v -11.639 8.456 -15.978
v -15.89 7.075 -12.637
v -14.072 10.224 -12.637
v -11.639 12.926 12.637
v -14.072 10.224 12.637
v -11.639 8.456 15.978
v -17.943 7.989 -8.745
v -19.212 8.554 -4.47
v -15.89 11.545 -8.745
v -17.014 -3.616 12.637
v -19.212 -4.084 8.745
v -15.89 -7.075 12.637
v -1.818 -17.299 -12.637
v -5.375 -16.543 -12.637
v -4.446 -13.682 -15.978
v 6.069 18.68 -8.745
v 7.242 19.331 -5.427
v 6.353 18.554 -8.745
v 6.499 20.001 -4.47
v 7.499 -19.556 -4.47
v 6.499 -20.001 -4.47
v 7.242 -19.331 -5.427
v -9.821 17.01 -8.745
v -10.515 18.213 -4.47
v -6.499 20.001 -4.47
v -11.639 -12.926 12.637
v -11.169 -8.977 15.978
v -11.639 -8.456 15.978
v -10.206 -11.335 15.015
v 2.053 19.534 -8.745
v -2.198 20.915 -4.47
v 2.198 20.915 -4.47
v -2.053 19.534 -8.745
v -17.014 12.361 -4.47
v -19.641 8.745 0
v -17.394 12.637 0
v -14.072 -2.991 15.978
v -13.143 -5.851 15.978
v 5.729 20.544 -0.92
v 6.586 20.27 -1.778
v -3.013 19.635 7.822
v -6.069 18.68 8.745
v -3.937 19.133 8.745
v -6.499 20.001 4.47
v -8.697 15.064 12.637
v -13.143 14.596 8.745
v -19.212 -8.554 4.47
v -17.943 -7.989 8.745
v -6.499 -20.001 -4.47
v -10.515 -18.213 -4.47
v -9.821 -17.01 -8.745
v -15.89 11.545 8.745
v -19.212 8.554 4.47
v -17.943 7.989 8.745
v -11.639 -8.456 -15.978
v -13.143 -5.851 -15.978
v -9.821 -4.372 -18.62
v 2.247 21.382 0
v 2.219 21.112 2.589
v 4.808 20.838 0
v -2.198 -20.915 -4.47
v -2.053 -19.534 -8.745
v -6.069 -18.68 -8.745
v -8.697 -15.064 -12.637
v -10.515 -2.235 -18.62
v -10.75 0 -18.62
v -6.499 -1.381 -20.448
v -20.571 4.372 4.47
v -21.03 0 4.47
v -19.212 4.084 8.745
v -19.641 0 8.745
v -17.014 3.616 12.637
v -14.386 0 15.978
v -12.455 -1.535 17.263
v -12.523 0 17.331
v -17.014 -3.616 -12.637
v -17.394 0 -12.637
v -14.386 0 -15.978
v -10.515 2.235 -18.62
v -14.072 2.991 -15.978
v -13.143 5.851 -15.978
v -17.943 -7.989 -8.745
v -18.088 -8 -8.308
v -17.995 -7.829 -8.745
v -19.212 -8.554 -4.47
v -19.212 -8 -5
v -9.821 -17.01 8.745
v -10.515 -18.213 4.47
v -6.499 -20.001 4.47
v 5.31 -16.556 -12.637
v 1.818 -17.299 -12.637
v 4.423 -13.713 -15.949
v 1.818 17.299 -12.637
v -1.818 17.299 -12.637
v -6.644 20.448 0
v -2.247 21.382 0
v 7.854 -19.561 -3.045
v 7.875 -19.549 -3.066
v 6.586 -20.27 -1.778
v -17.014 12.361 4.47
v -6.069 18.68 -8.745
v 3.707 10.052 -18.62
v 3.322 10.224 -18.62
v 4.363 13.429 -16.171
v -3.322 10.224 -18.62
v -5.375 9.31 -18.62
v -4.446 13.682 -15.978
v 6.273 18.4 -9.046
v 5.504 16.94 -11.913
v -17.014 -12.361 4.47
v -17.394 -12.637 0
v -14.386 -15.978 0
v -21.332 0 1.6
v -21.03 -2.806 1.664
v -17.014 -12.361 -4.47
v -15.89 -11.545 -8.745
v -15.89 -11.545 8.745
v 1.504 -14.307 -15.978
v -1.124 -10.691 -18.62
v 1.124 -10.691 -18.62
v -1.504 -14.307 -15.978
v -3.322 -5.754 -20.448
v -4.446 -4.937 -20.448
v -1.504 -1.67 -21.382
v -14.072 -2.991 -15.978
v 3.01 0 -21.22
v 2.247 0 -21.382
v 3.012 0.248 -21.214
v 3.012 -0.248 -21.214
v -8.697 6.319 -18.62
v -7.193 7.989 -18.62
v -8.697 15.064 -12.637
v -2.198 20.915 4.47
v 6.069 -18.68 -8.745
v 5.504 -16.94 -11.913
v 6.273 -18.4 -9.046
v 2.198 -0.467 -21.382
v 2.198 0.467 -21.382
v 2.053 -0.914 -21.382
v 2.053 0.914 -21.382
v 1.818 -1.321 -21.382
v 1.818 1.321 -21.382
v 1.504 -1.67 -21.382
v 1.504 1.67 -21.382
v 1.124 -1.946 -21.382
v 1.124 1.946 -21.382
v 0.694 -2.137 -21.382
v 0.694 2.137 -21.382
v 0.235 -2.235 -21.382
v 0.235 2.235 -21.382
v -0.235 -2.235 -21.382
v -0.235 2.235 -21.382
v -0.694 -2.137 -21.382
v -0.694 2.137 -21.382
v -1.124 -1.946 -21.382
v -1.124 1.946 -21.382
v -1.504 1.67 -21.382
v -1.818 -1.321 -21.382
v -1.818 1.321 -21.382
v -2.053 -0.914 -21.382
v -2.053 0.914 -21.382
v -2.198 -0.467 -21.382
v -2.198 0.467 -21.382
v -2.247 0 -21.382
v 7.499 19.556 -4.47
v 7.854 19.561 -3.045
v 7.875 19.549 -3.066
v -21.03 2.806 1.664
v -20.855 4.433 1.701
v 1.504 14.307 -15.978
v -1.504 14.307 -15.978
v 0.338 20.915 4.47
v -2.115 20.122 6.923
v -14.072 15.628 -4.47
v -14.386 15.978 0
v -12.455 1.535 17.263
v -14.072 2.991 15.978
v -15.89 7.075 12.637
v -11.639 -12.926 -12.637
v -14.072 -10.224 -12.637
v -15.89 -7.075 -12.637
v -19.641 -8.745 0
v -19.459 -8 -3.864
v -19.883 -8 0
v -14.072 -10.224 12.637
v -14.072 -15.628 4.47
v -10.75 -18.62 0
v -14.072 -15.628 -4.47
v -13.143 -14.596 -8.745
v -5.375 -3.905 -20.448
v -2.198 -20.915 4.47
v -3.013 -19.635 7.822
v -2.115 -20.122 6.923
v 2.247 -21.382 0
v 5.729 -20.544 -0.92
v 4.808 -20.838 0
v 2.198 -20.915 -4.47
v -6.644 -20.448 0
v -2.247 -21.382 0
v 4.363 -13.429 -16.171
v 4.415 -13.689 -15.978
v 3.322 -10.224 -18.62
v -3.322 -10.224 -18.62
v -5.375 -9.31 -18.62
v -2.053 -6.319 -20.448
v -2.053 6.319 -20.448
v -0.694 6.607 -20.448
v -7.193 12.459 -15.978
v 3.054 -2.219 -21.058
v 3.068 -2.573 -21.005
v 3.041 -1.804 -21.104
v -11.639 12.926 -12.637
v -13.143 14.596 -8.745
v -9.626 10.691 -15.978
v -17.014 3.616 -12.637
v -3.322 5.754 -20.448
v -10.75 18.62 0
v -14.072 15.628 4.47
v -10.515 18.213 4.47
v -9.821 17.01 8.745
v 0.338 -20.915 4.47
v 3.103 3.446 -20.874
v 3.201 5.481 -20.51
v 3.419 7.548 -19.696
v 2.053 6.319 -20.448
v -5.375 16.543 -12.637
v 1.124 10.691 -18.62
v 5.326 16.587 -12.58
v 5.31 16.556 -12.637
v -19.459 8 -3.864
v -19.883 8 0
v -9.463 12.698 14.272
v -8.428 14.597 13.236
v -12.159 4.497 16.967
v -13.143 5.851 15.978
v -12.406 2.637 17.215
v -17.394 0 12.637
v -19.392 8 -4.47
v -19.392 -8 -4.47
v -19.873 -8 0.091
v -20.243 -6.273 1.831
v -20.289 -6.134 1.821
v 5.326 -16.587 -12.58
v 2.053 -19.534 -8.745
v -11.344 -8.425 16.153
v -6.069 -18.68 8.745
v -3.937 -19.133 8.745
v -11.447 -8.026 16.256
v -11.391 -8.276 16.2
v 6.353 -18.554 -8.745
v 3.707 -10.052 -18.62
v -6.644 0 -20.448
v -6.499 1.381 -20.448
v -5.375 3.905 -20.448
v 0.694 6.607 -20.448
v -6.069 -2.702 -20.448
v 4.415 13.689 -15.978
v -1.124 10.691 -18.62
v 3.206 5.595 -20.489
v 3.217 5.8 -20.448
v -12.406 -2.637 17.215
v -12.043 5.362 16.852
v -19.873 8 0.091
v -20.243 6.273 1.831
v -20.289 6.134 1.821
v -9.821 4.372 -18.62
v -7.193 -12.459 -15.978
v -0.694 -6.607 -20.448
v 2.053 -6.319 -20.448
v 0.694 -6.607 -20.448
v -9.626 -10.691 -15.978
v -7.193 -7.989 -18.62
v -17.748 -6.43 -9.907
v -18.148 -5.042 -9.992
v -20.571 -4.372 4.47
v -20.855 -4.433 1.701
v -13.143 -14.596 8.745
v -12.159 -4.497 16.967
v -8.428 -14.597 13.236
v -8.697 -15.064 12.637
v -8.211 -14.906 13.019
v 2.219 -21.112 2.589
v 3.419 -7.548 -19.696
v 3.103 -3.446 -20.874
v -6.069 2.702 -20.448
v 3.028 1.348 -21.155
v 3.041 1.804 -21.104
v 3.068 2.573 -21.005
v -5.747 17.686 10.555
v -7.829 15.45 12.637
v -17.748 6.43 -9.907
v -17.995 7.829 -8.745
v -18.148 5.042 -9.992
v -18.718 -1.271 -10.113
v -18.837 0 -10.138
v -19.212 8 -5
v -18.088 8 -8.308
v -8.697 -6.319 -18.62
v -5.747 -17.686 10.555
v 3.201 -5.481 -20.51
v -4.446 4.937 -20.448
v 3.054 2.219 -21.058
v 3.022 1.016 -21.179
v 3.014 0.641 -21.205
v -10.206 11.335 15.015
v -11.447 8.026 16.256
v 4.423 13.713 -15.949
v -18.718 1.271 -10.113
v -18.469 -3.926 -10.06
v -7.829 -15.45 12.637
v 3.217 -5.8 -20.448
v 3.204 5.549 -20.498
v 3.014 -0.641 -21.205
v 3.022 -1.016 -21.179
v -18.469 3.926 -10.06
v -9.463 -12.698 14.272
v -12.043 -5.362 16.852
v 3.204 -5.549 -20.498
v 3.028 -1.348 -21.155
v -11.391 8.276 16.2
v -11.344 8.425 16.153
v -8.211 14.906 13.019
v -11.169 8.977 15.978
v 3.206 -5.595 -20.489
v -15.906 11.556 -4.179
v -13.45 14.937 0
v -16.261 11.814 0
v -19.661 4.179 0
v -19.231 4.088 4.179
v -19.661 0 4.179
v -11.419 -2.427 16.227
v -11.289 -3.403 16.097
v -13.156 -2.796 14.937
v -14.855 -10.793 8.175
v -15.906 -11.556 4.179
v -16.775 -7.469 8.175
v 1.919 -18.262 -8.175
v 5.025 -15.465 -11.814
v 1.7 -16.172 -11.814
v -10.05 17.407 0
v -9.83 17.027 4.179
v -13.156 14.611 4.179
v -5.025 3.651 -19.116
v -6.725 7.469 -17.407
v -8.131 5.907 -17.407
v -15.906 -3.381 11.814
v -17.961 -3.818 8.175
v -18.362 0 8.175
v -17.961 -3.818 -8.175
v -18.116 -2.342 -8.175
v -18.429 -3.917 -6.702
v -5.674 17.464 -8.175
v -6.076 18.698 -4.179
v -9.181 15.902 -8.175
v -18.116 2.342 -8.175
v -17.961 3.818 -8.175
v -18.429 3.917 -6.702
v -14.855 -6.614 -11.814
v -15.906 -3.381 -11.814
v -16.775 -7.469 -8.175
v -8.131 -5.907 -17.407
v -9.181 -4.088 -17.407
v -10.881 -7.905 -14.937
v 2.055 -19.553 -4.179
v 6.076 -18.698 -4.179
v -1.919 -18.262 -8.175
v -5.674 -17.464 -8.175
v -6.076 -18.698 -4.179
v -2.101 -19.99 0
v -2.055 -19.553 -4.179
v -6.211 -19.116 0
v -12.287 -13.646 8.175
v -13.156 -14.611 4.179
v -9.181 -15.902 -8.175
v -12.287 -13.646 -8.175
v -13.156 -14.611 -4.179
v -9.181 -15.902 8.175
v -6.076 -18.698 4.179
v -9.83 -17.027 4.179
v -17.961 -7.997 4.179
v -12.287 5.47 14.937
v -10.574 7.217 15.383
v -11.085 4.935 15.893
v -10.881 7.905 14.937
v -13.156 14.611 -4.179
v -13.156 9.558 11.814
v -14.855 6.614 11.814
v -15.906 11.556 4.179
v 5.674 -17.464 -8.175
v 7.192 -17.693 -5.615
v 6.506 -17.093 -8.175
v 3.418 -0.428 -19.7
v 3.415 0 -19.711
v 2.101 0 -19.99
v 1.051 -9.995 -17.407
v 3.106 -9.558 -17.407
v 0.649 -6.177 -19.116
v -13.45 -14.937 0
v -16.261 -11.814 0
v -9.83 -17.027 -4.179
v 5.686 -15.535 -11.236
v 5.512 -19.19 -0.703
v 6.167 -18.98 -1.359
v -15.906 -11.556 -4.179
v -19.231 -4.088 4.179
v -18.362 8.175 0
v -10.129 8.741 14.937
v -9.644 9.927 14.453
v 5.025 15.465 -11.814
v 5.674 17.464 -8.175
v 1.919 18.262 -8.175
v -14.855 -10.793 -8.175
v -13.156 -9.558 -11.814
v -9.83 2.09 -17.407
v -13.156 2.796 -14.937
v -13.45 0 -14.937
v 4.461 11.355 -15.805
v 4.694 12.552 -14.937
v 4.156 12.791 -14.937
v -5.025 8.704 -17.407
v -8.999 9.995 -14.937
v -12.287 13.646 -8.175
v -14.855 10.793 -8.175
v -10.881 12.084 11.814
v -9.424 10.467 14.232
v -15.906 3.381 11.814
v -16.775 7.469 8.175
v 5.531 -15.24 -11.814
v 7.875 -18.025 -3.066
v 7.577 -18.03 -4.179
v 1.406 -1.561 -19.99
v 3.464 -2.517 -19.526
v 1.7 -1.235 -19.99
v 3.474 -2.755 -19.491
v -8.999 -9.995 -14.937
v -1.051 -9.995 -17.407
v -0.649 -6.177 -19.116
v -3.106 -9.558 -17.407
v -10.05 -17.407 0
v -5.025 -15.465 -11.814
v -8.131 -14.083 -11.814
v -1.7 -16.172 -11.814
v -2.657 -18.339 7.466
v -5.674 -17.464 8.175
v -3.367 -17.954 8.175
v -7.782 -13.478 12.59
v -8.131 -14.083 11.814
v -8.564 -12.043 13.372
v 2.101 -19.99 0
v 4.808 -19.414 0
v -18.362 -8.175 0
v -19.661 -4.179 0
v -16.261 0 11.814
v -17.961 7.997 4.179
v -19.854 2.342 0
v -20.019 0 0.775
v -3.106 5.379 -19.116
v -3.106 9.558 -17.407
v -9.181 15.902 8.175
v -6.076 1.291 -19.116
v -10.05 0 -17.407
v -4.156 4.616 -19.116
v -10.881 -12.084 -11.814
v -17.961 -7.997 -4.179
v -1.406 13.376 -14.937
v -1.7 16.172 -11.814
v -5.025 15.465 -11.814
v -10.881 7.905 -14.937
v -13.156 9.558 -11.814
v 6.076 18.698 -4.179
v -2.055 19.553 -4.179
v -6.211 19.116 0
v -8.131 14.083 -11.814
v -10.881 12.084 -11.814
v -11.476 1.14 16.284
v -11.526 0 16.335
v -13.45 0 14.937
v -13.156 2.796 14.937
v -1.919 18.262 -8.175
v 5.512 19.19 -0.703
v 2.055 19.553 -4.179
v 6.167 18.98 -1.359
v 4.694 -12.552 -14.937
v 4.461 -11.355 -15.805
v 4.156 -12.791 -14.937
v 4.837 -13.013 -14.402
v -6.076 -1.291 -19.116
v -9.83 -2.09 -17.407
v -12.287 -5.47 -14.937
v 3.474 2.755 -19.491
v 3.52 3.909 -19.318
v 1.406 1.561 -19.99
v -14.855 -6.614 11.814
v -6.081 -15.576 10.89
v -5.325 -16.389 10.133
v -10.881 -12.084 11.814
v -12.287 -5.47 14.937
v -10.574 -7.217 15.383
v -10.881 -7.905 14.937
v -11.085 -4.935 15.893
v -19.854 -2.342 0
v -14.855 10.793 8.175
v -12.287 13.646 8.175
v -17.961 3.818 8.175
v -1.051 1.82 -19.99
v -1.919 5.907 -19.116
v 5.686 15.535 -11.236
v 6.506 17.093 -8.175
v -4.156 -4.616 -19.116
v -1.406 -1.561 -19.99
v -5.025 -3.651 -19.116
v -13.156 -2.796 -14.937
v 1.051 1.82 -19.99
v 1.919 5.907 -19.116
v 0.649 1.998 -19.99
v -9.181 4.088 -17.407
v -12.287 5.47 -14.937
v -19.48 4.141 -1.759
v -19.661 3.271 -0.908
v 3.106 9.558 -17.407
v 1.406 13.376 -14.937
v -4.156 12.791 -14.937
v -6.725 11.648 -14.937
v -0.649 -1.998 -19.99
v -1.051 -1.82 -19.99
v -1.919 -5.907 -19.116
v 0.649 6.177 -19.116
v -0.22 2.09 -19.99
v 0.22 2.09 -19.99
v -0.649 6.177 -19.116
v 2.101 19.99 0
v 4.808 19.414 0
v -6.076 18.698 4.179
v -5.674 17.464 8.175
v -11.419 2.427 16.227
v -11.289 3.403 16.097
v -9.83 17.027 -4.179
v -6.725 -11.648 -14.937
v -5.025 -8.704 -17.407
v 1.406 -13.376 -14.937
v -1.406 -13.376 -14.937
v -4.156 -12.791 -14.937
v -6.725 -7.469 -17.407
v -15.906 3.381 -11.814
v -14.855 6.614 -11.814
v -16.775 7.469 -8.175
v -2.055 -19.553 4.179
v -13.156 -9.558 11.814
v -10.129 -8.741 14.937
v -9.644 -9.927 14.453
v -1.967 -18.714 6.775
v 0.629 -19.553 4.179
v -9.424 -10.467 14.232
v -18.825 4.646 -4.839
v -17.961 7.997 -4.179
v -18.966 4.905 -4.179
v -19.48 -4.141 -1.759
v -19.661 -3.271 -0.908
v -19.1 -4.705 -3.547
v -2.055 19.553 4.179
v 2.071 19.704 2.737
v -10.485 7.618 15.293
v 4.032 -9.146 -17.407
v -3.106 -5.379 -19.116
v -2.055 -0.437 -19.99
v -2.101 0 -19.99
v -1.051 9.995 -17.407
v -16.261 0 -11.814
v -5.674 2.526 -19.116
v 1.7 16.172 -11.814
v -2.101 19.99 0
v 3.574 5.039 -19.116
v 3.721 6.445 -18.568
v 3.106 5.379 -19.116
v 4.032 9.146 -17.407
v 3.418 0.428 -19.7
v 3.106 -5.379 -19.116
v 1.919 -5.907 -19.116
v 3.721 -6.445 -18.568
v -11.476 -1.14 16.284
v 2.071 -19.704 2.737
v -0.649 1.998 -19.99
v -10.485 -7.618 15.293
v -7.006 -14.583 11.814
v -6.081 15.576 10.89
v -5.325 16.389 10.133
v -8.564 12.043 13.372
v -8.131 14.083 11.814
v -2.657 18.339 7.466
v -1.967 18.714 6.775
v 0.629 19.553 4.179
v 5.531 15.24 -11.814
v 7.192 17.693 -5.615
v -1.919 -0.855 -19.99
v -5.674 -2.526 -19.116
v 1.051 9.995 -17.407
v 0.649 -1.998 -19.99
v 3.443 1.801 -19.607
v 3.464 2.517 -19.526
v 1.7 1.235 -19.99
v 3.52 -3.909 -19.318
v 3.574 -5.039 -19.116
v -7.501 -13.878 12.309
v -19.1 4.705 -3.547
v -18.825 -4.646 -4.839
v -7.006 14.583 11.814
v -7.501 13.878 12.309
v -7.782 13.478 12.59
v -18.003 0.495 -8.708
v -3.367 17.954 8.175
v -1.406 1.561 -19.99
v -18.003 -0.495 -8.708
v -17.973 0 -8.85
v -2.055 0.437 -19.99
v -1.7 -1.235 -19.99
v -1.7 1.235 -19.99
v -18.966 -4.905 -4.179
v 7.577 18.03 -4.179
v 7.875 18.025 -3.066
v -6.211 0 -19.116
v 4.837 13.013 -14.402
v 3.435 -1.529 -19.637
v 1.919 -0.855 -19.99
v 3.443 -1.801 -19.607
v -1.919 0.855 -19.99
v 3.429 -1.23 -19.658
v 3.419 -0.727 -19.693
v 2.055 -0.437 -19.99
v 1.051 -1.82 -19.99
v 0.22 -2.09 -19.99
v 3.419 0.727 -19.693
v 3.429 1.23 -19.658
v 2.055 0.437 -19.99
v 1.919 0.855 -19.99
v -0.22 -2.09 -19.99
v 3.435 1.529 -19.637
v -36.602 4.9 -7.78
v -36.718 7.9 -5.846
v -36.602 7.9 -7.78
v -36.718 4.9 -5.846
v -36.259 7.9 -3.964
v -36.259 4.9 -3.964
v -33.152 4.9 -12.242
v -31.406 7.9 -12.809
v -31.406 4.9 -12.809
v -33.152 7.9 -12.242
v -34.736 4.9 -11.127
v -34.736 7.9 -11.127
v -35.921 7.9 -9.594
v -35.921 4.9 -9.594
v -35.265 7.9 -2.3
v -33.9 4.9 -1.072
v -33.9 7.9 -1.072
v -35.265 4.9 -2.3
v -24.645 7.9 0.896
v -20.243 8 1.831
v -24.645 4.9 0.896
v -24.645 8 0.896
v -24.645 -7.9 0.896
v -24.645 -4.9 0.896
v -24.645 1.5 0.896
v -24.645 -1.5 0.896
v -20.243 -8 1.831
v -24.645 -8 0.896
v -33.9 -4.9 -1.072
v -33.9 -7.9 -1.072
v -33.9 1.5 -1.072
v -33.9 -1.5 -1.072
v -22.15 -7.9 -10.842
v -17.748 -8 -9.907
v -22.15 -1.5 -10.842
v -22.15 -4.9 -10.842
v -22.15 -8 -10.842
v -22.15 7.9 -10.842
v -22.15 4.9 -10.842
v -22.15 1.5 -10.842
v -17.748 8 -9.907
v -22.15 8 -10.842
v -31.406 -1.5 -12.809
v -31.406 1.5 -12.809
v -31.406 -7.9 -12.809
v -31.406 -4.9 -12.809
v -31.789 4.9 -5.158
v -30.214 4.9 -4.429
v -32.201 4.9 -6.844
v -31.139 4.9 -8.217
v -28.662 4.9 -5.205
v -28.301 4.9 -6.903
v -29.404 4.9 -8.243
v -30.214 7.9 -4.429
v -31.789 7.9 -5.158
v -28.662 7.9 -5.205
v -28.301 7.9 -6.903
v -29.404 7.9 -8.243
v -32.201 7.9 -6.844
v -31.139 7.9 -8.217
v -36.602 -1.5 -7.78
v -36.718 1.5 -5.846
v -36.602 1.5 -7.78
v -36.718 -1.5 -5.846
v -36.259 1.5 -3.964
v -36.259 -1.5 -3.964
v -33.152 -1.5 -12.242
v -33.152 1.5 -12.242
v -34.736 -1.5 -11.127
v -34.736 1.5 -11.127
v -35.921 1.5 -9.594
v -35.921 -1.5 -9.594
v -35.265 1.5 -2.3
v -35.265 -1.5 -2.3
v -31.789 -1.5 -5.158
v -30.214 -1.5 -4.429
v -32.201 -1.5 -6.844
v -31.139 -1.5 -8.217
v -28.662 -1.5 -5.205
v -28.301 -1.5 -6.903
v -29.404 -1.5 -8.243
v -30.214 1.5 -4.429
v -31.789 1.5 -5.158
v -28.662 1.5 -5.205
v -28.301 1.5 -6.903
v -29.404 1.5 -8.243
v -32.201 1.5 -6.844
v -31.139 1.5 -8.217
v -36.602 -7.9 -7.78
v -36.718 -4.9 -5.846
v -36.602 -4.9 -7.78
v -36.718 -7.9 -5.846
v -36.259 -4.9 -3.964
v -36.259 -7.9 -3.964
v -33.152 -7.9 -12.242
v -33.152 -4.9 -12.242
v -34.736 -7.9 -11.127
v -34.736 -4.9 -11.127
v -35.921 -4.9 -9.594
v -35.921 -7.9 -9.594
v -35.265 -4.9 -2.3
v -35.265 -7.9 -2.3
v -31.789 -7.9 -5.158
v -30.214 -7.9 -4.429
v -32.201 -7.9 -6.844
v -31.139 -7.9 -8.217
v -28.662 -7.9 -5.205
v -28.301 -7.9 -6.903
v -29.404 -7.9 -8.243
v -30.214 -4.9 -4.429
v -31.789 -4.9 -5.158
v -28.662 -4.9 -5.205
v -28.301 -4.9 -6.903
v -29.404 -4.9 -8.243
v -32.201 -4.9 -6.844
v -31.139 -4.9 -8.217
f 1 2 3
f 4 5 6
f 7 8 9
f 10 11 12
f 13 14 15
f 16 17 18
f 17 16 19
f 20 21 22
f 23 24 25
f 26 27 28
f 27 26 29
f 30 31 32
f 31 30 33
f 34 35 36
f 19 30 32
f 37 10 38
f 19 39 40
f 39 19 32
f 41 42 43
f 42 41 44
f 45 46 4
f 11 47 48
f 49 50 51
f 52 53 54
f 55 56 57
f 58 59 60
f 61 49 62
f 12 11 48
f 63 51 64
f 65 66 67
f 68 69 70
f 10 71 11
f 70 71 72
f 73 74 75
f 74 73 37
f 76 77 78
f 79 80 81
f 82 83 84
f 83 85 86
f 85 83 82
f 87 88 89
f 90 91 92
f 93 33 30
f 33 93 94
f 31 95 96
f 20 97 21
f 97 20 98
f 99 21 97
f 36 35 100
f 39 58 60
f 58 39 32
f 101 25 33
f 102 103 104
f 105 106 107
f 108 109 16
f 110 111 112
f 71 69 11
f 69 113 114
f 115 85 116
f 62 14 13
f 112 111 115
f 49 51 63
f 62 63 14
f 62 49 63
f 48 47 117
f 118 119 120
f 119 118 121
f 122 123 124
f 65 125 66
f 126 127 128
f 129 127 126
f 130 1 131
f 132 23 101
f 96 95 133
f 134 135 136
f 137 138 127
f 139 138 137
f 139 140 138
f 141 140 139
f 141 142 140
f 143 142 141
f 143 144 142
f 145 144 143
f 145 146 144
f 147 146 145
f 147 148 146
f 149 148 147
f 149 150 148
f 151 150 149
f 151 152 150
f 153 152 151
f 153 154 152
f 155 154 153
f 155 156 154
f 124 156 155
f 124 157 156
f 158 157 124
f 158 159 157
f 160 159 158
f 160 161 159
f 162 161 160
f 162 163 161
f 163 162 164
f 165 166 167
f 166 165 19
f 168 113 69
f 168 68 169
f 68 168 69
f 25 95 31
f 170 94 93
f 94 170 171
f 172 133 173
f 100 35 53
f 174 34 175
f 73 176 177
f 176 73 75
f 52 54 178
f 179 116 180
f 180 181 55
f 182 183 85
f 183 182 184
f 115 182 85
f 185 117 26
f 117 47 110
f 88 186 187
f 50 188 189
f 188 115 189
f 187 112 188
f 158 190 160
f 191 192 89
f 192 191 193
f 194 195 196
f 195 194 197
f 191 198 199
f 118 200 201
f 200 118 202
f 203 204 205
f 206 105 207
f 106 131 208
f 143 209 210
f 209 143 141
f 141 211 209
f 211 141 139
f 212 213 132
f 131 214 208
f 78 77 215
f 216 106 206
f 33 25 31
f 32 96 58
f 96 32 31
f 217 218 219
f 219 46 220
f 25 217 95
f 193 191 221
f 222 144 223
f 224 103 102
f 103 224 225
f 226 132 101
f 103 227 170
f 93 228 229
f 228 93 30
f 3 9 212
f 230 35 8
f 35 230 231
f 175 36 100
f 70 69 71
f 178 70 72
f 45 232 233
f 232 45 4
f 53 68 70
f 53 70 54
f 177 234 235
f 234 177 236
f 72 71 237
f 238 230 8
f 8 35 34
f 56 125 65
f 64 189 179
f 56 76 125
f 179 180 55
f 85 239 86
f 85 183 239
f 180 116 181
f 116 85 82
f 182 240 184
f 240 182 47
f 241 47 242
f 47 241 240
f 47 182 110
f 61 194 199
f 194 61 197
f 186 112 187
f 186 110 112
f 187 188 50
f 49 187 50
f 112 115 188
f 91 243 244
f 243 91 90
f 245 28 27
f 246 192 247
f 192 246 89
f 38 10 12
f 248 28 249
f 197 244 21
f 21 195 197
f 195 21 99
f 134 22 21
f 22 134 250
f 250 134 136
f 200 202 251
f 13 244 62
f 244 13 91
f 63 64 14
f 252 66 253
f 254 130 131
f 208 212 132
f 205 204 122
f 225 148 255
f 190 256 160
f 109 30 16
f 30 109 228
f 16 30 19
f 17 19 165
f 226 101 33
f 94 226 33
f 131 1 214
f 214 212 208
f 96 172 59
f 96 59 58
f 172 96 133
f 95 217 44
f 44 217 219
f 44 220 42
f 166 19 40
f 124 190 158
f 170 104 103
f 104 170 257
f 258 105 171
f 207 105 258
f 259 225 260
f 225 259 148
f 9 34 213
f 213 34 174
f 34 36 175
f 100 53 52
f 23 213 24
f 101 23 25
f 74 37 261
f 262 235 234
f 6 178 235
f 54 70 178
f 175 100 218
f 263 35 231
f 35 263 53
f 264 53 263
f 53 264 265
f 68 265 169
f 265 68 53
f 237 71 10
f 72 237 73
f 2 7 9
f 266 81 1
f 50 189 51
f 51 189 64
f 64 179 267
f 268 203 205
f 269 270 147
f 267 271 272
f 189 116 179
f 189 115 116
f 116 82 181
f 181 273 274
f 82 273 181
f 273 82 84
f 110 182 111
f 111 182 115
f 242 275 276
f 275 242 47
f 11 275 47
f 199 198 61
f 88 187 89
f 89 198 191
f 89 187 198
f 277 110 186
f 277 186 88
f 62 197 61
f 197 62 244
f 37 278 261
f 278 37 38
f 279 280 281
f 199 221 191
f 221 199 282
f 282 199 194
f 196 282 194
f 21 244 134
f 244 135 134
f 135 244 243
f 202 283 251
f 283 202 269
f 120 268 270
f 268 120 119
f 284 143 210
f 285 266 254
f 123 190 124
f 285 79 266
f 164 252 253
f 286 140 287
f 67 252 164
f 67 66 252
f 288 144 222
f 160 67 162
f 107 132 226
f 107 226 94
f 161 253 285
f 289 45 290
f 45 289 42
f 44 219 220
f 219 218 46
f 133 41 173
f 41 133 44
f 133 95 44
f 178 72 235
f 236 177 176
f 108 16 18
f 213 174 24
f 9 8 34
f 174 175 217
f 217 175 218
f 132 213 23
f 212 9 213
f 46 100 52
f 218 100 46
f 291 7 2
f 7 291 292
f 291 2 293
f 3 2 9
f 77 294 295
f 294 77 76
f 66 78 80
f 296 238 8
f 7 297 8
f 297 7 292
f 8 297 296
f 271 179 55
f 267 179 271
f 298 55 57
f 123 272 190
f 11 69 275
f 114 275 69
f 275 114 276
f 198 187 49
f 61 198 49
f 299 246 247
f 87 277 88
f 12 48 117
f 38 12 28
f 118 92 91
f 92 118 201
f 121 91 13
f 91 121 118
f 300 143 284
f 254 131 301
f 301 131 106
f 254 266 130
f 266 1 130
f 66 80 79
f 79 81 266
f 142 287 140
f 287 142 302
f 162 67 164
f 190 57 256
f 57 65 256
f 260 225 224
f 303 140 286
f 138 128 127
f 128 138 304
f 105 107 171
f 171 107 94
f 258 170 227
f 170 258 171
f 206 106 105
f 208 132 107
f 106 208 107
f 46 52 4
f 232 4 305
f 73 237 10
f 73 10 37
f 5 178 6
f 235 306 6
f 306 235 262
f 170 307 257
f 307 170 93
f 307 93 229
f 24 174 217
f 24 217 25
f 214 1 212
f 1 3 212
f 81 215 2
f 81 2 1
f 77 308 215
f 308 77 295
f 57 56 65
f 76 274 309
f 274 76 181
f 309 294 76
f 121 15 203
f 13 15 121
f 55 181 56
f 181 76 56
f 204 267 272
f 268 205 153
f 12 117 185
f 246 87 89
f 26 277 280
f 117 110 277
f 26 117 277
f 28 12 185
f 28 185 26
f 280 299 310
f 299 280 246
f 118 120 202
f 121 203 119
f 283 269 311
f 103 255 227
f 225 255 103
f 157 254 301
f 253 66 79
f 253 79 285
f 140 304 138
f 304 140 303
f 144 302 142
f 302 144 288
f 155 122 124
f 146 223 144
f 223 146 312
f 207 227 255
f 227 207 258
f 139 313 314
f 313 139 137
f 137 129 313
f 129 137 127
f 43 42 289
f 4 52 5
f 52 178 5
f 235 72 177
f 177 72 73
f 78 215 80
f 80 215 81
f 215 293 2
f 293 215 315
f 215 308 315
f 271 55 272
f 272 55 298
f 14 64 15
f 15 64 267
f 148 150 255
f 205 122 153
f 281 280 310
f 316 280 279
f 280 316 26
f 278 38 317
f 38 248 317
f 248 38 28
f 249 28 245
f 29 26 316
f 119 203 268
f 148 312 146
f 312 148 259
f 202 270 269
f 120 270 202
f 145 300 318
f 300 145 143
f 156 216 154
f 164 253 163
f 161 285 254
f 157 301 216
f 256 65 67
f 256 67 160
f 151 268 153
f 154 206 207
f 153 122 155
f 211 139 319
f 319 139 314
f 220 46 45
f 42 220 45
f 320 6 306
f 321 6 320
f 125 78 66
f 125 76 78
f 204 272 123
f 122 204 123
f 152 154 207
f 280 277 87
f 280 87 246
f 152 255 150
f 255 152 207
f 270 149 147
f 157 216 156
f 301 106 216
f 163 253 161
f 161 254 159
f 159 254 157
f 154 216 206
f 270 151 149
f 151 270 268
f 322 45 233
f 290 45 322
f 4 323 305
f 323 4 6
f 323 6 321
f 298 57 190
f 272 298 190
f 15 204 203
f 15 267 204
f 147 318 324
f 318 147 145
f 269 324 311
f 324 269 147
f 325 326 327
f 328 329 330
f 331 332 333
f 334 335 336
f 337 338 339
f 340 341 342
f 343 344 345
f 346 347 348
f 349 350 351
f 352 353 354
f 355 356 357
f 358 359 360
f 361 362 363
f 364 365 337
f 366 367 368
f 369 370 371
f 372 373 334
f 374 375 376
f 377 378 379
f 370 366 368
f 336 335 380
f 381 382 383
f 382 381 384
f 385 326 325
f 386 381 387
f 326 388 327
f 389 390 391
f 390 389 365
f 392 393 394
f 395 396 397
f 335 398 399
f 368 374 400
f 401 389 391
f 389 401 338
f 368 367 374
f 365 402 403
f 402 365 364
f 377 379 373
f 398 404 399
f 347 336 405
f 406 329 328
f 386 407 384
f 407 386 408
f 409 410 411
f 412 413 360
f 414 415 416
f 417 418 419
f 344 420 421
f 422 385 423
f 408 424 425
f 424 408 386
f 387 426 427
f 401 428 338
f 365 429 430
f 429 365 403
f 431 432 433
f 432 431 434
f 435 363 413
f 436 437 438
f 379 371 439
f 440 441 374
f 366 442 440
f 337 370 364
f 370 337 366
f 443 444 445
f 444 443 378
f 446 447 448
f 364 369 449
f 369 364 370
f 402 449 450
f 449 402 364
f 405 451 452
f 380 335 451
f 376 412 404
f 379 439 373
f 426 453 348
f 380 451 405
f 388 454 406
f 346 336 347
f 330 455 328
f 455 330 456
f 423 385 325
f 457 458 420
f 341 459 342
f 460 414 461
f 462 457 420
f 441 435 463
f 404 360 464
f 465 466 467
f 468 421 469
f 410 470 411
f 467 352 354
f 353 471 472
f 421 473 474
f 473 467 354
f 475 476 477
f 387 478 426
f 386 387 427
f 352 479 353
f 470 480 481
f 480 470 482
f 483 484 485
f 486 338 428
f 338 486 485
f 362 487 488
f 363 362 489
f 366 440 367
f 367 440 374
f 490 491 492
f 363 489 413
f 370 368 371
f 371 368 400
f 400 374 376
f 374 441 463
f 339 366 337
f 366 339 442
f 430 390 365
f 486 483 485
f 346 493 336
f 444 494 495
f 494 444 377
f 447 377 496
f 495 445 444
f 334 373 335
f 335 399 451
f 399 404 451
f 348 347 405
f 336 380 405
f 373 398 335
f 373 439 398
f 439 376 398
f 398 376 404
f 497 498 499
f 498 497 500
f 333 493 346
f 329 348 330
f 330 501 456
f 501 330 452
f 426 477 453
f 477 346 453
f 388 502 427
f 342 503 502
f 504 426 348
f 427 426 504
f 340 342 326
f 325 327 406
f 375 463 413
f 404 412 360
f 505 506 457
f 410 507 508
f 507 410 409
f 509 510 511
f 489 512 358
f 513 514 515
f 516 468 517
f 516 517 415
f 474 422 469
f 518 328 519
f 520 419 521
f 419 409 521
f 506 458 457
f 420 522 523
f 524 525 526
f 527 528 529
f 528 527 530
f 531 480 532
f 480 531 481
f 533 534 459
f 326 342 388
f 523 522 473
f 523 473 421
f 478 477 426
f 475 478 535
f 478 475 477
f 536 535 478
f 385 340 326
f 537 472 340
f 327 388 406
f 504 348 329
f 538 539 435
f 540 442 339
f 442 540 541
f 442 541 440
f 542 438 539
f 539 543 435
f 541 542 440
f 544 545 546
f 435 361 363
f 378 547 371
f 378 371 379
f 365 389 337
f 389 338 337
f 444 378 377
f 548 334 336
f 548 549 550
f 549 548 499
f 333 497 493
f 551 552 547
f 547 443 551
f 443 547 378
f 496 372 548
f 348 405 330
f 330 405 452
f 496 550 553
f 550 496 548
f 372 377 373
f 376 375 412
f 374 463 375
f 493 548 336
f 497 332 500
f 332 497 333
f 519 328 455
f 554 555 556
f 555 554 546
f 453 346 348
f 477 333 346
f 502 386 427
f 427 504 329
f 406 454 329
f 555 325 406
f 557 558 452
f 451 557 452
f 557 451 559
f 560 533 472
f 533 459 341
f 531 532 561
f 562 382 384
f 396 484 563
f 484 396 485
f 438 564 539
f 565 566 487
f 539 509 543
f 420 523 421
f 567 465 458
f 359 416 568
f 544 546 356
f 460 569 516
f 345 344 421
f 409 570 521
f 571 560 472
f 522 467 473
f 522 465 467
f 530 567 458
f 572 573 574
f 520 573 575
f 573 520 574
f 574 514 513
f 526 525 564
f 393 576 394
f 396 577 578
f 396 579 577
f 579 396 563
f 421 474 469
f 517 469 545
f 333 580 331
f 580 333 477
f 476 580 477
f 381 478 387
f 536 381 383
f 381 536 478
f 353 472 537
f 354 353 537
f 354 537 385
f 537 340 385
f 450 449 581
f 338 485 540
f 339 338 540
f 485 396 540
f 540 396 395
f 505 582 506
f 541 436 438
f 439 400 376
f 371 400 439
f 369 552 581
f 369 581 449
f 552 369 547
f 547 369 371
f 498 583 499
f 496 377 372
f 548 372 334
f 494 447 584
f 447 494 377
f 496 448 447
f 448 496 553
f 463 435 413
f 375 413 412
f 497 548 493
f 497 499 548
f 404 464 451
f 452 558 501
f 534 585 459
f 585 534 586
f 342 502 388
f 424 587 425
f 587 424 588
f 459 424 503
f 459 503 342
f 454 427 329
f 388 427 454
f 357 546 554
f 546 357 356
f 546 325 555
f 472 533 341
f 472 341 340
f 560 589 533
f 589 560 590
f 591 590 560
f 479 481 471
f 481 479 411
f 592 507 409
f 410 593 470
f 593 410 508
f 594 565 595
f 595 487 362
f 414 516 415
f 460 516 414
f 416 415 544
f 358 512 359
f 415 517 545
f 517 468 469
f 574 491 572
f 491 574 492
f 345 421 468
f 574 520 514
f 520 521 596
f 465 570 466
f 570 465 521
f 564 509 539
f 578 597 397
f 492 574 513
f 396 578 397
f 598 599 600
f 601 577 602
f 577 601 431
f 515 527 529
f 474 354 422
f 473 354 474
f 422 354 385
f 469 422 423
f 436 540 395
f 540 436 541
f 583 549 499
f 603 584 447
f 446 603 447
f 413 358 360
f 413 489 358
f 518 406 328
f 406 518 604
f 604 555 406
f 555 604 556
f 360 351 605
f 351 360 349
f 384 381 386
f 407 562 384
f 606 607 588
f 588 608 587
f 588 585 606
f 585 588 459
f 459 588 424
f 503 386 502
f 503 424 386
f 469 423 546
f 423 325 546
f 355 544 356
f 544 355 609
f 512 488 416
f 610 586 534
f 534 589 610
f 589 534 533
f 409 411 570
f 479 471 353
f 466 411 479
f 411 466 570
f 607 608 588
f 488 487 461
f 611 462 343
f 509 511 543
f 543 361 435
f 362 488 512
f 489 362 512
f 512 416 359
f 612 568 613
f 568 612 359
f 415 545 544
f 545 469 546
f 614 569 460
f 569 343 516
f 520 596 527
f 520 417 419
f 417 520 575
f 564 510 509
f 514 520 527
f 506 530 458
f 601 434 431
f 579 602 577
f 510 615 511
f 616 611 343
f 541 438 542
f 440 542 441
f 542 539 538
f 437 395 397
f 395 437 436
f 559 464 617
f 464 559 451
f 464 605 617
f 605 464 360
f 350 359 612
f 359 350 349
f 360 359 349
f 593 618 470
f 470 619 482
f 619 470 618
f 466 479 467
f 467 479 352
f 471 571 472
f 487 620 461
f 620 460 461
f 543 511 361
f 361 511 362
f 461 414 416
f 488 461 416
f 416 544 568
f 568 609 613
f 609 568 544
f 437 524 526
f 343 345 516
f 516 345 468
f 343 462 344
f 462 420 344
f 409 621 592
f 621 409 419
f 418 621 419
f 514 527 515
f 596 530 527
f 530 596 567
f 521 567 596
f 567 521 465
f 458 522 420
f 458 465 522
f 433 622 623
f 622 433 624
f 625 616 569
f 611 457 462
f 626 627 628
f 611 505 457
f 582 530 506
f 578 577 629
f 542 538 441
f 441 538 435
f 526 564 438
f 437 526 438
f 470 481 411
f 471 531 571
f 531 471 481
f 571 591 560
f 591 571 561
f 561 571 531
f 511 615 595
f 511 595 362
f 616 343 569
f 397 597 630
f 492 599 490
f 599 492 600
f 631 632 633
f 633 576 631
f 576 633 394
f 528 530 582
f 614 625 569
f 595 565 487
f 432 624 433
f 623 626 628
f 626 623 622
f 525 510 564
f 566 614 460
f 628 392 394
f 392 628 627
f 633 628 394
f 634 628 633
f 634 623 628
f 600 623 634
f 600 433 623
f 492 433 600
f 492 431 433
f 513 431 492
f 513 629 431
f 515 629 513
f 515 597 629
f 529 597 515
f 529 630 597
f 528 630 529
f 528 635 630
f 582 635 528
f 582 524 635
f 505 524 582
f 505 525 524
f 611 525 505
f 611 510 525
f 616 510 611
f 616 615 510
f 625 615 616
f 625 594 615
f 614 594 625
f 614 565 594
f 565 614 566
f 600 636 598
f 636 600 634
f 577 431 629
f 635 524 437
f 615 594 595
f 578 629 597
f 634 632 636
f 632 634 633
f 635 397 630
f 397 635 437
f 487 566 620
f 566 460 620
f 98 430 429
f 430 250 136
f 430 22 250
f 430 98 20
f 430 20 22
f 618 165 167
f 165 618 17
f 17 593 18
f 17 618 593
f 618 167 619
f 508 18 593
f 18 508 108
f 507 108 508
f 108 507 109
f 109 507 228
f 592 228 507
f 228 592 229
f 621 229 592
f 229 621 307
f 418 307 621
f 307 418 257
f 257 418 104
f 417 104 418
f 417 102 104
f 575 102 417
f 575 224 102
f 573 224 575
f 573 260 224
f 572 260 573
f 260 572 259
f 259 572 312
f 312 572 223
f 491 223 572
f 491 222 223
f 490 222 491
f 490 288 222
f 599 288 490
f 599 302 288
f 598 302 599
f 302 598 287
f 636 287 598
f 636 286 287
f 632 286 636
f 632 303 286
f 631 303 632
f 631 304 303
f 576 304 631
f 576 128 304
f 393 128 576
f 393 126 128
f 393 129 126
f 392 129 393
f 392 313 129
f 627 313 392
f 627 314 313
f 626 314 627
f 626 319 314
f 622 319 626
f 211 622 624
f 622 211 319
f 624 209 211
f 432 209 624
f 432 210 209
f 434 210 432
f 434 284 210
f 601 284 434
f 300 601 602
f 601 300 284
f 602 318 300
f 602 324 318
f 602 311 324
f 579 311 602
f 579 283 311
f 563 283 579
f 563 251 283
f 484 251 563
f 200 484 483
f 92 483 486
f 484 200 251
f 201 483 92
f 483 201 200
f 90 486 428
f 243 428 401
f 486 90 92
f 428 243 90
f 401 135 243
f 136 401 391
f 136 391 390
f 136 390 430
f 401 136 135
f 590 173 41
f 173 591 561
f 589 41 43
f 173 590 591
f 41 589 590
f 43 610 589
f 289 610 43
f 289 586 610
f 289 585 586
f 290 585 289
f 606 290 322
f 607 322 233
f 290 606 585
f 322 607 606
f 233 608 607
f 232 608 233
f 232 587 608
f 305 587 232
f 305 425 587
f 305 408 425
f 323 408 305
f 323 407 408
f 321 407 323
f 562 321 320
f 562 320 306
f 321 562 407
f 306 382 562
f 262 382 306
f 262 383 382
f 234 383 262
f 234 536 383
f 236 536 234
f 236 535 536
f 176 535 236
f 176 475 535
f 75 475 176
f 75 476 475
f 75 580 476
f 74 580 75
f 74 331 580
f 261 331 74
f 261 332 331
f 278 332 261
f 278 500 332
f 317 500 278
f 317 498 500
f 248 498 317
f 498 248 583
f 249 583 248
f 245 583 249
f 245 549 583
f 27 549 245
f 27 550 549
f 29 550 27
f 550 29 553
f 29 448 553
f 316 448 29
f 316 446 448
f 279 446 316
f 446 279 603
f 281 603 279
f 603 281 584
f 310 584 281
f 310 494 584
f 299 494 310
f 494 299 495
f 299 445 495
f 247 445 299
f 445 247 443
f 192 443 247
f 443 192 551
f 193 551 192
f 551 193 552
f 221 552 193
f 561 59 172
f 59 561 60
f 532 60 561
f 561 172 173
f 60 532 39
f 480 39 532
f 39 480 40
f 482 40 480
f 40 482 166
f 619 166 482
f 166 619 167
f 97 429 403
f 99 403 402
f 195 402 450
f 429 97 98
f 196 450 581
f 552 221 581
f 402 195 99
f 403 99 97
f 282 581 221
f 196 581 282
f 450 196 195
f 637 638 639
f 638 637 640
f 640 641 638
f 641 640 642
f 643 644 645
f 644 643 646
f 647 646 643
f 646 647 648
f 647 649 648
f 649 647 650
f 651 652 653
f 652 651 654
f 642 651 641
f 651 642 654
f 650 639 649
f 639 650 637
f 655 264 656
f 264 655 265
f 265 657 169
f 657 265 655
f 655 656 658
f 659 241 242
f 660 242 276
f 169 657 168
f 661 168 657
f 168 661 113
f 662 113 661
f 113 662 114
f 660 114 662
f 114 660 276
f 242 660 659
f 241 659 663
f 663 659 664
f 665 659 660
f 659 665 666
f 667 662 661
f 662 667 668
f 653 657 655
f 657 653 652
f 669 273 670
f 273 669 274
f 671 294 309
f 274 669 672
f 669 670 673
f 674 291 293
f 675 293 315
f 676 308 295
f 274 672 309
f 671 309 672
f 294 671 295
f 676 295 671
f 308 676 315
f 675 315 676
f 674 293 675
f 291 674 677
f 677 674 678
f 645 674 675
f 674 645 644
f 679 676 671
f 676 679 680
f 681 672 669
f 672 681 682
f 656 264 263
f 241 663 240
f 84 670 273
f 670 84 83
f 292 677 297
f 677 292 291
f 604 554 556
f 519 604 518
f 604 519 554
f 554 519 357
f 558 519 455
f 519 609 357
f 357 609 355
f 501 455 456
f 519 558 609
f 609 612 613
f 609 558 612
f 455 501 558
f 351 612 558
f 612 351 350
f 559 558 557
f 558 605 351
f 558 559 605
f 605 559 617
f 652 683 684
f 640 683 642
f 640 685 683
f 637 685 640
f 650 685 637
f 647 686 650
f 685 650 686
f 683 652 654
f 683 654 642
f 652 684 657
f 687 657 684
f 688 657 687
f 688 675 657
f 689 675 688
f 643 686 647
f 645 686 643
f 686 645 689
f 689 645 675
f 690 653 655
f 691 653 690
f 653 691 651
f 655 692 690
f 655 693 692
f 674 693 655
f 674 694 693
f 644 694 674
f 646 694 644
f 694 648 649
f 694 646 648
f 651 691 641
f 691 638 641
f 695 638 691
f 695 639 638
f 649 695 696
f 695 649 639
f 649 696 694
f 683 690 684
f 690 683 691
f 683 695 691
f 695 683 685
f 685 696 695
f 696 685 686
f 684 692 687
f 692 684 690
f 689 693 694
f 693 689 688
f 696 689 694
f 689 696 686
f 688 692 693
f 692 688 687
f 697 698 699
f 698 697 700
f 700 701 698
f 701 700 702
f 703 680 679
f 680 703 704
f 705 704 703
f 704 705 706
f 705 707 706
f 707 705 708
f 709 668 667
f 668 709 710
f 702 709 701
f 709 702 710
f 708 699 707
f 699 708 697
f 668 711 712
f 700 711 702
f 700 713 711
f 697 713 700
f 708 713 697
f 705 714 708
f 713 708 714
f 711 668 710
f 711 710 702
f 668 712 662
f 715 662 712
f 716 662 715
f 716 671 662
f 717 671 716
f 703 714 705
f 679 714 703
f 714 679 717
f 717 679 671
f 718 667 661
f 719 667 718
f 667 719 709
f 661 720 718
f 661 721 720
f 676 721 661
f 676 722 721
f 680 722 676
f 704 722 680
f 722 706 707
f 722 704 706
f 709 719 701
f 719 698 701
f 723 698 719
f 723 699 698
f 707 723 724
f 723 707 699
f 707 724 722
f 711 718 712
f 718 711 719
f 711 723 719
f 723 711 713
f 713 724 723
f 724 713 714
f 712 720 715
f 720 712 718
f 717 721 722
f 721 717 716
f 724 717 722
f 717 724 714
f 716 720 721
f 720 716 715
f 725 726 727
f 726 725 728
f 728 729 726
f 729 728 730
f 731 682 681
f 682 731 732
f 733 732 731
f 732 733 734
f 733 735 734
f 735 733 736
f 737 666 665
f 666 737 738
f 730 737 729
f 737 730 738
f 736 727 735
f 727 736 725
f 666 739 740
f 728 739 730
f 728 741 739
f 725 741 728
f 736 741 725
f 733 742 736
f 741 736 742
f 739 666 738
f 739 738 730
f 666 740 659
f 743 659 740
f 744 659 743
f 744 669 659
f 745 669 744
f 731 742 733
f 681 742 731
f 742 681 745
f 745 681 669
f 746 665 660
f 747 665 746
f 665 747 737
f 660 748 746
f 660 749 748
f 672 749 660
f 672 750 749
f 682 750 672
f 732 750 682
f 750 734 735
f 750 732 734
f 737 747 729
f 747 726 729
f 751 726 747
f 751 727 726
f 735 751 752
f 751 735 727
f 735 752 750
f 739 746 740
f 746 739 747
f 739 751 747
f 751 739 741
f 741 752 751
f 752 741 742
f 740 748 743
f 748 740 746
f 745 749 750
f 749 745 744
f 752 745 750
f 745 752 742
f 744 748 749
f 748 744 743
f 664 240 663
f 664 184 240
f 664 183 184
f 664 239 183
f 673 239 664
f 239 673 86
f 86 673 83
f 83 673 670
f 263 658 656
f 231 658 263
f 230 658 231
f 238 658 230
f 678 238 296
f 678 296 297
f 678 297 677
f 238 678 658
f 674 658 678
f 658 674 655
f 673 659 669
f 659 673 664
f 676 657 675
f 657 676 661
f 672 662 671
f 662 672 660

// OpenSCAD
// file: lib.scad
module hull_box(l,w,h,c, center=true)
{	
    translate([center ? 0 : l/2, center ? 0 : w/2, center ? 0 : h/2]) 
	hull() {
        translate([-l/2+c, -w/2+c, -h/2+c]) sphere(r=c);
        translate([ l/2-c, -w/2+c, -h/2+c]) sphere(r=c);
        translate([ l/2-c,  w/2-c, -h/2+c]) sphere(r=c);
        translate([-l/2+c,  w/2-c, -h/2+c]) sphere(r=c);
        translate([-l/2+c, -w/2+c,  h/2-c]) sphere(r=c);
        translate([ l/2-c, -w/2+c,  h/2-c]) sphere(r=c);
        translate([ l/2-c,  w/2-c,  h/2-c]) sphere(r=c);
        translate([-l/2+c,  w/2-c,  h/2-c]) sphere(r=c);
    }
}

module wedge(l,w,h1,h2) {
    hull() {
        translate([0,(l-h1)/2,0])
            rotate([0,90,0]) cylinder(d=h1, h=w, center=true);
        translate([0,-l*0.45,0])
            cube([w,l*0.1,h2], center=true);
    }
}

module hinge_unit(p,d,l,w,h) {
    difference() {
        intersection() {
            cube([l,w,h], center=true);
            union() {
                translate([p,0,0]) rotate([90,0,0]) cylinder(d=(l/2-p)*2,h=2*w, center=true);
                translate([-l/2,-w,-h/2]) cube([l/2+p,w*2,h]);
            }
        }
        translate([p,0,0]) rotate([90,0,0]) cylinder(d=d,h=2*w, center=true);
    }
}

module hinge_n(p,d,l,w,h,j=0.2, n=1, base_h=0) {
    translate([0,(l-base_h)/2,0])
        cube([(2*n-1)*(w+j),base_h,h], center=true);
	translate([-(n-1)*(w+j),0,0]) for (i = [0 : n-1] ) {
		translate([ 2*i*(w+j), 0, 0]) rotate([0,0,270]) hinge_unit(p,d,l,w,h);
	}
}

module hinge_lock(hd,hl,e,j=0.2, endlock=true) {
    cylinder(d=hd-j, h=hl, center=true);
    translate([-e,0,hl/2]) rotate([90,0,0]) rotate_extrude(angle=180)
       translate([e, 0, 0]) circle(d=hd-j);
    translate([-2*e,0,0]) rotate([0,0,0]) cylinder(d=hd-j, h=hl, center=true);
    translate([-e,0,-hl/2]) rotate([90,0,0]) rotate_extrude(angle=90)
       translate([-e, 0, 0]) circle(d=hd-j);
	if (endlock) {
		translate([-e/2,0,-hl/2-hd]) rotate([0,90,0]) cylinder(d=hd-j, h=hl/4, center=true);
	}
}

module grip(l, d, f=1.2, t=0.5, dg=0, dh=1, dfl=1, center=true) {
    difference() {
        hull() {
            cylinder(h=l, d=d*f, center=center);
            if (dg != 0) {
                translate([dg + (t>0 ? 1 : -1) * (center ? d/2 : 0), 0, 0])
#                    cylinder(h=l*dfl, d=dh, center=center);
            }
        }
        cylinder(h=l*1.1, d=d, center=center);
        translate([d*f*t, 0, 0])
            cube([d*f,d*f,l*1.1], center=center);
    }
}

module angle_hold(a,r,l,t,d, f=1.2, dt=0.67, fl=1, dg=0, dh=1, dfl=1) {
    difference() {
        rotate_extrude(angle=a)
            translate([r, 0, 0]) square([l,t], center=true);
        rotate([90,0,90-0.5])
            translate([0,0,r]) cylinder(h=l*f, d=d*f, center=true);
        rotate([90,0,90+a+0.5])
            translate([0,0,r]) cylinder(h=l*f, d=d*f, center=true);
    }
    rotate([90,0,90])
        translate([0,0,r*0.995]) grip(l=l*fl, d=d, f=f, t=-dt, dg=dg, dh=dh, dfl=dfl);
    rotate([90,0,90+a])
        translate([0,0,r*0.995]) grip(l=l*fl, d=d, f=f, t=dt, dg=-dg, dh=dh, dfl=dfl);
}

module tube_lock(hinge_p, hinge_d, hinge_l, hinge_w, hinge_h, grip_l, grip_d, n=1, flat=true, f_grip=1.2) {
    difference() {
        union() {
            grip(grip_l, grip_d, f_grip);
            translate([flat?-hinge_w/2:0,-(hinge_l+grip_d)/2,0]) 
                rotate([0, flat?0:90, 0])
                    hinge_n(hinge_p,hinge_d,hinge_l,hinge_w,hinge_h, n=n);
            translate([flat?-hinge_w/2:0,(hinge_l+grip_d)/2,0]) rotate([0,0,180])
                rotate([0, flat?0:90, 0])
                    hinge_n(hinge_p,hinge_d,hinge_l,hinge_w,hinge_h, n=n);
        }
        if(!flat) {
            translate([grip_d/2,0,0])
                cube([grip_d,grip_d*f_grip,grip_l], center=true);
        }
    }
}

module sphere_hold(d,e,j,d1,a1,d2,a2) {
    difference() {
        sphere(d=d+e);
        sphere(d=d+j);
        rotate([0,a1,0]) translate([d1,0,0])
#            cube([d+e+j,d+e+j,d+e+j], center=true);
        rotate([0,a2,0]) translate([d2,0,0])
#            cube([d+e+j,d+e+j,d+e+j], center=true);
    }
}

module sphere_magnet_hold(d,e,c,j,d1,a1,d2,a2) {
    difference() {
        sphere_hold(d,e,j,d1,a1,d2,a2);
        translate([-(d+c)/2,0,0])
#            cube([c+j,c+j,c+j], center=true);
    }
}

module sphere_hinge_hold(d,e,j,d1,a1,d2,a2,hp,hd,hl,hw,hh,hn=3,ah=0,av=0) {
	sphere_hold(d,e,j,d1,a1,d2,a2);
	rotate([0,ah,0]) 
		translate([-(d+hl)*0.49,0,0]) 
			rotate([0,av,-90])
				hinge_n(hp,hd,hl,hw,hh, n=hn, base_h=e*1.5);
}
// main file
include<lib.scad>

lampe_boule_d=40;

jeu=0.2;
epaisseur=3;

portee=2.5;
vis=4;
hinge_l=18;
hinge_w=3;
hinge_h=12;

sphere_hinge_hold(
        lampe_boule_d, epaisseur, jeu,
        30, 15, 25, -45,
        portee,vis,hinge_l,hinge_w,hinge_h,
        hn=3,ah=-12,av=0
    );
